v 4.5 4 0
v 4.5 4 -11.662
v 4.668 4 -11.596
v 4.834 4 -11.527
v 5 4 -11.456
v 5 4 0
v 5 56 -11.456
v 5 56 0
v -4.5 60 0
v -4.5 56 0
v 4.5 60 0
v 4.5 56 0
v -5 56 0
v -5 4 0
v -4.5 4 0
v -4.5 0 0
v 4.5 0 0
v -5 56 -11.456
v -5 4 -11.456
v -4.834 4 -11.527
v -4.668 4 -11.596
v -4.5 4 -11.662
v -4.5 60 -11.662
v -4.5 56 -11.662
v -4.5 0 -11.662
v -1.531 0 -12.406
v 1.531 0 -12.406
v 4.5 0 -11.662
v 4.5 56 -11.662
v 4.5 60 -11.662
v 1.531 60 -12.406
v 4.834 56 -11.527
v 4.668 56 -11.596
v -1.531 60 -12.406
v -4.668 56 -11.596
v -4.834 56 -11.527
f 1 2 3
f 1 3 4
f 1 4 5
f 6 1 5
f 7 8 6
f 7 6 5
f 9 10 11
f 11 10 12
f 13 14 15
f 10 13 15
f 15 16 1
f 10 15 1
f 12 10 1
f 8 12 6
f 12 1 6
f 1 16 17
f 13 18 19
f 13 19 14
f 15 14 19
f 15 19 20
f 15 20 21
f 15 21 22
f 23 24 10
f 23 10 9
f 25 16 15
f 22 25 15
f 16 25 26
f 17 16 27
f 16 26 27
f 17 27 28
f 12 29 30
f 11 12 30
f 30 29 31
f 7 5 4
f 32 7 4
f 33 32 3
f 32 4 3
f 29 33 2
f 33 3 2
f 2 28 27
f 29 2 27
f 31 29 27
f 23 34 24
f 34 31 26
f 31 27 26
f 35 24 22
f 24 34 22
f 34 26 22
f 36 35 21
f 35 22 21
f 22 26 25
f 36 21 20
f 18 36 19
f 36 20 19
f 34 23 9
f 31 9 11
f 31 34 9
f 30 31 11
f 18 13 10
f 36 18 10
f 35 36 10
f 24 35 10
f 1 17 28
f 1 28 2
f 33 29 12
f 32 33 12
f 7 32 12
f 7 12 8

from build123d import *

# Parameters (mm, degrees)
BOSS_EXTRUDE1_DEPTH = 60
SKETCH3_W           = 0.5
SKETCH3_H           = 4
CUT_EXTRUDE1_DEPTH  = 20


with BuildPart() as part:
    # Sketch2 → Boss-Extrude1 (new body)
    with BuildSketch(Plane(origin=(0, 0, 0), x_dir=(1, 0, 0), z_dir=(0, 1, 0))):
        with BuildLine():
            Line((-5, 0), (5, 0))
            Line((5, 0), (5, 11.456439237))
            ThreePointArc((5, 11.456439237), (0, 12.5), (-5, 11.456439237))
            Line((-5, 11.456439237), (-5, 0))
        make_face()
    extrude(amount=BOSS_EXTRUDE1_DEPTH)

    # Sketch3 → Cut-Extrude1 (cut)
    with BuildSketch(Plane.XY):
        with Locations((-4.75, 2)):
            Rectangle(SKETCH3_W, SKETCH3_H)
        with Locations((4.75, 2)):
            Rectangle(SKETCH3_W, SKETCH3_H)
        with Locations((4.75, 58)):
            Rectangle(SKETCH3_W, SKETCH3_H)
        with Locations((-4.75, 58)):
            Rectangle(SKETCH3_W, SKETCH3_H)
    extrude(amount=-CUT_EXTRUDE1_DEPTH, mode=Mode.SUBTRACT)


solid = part.part
